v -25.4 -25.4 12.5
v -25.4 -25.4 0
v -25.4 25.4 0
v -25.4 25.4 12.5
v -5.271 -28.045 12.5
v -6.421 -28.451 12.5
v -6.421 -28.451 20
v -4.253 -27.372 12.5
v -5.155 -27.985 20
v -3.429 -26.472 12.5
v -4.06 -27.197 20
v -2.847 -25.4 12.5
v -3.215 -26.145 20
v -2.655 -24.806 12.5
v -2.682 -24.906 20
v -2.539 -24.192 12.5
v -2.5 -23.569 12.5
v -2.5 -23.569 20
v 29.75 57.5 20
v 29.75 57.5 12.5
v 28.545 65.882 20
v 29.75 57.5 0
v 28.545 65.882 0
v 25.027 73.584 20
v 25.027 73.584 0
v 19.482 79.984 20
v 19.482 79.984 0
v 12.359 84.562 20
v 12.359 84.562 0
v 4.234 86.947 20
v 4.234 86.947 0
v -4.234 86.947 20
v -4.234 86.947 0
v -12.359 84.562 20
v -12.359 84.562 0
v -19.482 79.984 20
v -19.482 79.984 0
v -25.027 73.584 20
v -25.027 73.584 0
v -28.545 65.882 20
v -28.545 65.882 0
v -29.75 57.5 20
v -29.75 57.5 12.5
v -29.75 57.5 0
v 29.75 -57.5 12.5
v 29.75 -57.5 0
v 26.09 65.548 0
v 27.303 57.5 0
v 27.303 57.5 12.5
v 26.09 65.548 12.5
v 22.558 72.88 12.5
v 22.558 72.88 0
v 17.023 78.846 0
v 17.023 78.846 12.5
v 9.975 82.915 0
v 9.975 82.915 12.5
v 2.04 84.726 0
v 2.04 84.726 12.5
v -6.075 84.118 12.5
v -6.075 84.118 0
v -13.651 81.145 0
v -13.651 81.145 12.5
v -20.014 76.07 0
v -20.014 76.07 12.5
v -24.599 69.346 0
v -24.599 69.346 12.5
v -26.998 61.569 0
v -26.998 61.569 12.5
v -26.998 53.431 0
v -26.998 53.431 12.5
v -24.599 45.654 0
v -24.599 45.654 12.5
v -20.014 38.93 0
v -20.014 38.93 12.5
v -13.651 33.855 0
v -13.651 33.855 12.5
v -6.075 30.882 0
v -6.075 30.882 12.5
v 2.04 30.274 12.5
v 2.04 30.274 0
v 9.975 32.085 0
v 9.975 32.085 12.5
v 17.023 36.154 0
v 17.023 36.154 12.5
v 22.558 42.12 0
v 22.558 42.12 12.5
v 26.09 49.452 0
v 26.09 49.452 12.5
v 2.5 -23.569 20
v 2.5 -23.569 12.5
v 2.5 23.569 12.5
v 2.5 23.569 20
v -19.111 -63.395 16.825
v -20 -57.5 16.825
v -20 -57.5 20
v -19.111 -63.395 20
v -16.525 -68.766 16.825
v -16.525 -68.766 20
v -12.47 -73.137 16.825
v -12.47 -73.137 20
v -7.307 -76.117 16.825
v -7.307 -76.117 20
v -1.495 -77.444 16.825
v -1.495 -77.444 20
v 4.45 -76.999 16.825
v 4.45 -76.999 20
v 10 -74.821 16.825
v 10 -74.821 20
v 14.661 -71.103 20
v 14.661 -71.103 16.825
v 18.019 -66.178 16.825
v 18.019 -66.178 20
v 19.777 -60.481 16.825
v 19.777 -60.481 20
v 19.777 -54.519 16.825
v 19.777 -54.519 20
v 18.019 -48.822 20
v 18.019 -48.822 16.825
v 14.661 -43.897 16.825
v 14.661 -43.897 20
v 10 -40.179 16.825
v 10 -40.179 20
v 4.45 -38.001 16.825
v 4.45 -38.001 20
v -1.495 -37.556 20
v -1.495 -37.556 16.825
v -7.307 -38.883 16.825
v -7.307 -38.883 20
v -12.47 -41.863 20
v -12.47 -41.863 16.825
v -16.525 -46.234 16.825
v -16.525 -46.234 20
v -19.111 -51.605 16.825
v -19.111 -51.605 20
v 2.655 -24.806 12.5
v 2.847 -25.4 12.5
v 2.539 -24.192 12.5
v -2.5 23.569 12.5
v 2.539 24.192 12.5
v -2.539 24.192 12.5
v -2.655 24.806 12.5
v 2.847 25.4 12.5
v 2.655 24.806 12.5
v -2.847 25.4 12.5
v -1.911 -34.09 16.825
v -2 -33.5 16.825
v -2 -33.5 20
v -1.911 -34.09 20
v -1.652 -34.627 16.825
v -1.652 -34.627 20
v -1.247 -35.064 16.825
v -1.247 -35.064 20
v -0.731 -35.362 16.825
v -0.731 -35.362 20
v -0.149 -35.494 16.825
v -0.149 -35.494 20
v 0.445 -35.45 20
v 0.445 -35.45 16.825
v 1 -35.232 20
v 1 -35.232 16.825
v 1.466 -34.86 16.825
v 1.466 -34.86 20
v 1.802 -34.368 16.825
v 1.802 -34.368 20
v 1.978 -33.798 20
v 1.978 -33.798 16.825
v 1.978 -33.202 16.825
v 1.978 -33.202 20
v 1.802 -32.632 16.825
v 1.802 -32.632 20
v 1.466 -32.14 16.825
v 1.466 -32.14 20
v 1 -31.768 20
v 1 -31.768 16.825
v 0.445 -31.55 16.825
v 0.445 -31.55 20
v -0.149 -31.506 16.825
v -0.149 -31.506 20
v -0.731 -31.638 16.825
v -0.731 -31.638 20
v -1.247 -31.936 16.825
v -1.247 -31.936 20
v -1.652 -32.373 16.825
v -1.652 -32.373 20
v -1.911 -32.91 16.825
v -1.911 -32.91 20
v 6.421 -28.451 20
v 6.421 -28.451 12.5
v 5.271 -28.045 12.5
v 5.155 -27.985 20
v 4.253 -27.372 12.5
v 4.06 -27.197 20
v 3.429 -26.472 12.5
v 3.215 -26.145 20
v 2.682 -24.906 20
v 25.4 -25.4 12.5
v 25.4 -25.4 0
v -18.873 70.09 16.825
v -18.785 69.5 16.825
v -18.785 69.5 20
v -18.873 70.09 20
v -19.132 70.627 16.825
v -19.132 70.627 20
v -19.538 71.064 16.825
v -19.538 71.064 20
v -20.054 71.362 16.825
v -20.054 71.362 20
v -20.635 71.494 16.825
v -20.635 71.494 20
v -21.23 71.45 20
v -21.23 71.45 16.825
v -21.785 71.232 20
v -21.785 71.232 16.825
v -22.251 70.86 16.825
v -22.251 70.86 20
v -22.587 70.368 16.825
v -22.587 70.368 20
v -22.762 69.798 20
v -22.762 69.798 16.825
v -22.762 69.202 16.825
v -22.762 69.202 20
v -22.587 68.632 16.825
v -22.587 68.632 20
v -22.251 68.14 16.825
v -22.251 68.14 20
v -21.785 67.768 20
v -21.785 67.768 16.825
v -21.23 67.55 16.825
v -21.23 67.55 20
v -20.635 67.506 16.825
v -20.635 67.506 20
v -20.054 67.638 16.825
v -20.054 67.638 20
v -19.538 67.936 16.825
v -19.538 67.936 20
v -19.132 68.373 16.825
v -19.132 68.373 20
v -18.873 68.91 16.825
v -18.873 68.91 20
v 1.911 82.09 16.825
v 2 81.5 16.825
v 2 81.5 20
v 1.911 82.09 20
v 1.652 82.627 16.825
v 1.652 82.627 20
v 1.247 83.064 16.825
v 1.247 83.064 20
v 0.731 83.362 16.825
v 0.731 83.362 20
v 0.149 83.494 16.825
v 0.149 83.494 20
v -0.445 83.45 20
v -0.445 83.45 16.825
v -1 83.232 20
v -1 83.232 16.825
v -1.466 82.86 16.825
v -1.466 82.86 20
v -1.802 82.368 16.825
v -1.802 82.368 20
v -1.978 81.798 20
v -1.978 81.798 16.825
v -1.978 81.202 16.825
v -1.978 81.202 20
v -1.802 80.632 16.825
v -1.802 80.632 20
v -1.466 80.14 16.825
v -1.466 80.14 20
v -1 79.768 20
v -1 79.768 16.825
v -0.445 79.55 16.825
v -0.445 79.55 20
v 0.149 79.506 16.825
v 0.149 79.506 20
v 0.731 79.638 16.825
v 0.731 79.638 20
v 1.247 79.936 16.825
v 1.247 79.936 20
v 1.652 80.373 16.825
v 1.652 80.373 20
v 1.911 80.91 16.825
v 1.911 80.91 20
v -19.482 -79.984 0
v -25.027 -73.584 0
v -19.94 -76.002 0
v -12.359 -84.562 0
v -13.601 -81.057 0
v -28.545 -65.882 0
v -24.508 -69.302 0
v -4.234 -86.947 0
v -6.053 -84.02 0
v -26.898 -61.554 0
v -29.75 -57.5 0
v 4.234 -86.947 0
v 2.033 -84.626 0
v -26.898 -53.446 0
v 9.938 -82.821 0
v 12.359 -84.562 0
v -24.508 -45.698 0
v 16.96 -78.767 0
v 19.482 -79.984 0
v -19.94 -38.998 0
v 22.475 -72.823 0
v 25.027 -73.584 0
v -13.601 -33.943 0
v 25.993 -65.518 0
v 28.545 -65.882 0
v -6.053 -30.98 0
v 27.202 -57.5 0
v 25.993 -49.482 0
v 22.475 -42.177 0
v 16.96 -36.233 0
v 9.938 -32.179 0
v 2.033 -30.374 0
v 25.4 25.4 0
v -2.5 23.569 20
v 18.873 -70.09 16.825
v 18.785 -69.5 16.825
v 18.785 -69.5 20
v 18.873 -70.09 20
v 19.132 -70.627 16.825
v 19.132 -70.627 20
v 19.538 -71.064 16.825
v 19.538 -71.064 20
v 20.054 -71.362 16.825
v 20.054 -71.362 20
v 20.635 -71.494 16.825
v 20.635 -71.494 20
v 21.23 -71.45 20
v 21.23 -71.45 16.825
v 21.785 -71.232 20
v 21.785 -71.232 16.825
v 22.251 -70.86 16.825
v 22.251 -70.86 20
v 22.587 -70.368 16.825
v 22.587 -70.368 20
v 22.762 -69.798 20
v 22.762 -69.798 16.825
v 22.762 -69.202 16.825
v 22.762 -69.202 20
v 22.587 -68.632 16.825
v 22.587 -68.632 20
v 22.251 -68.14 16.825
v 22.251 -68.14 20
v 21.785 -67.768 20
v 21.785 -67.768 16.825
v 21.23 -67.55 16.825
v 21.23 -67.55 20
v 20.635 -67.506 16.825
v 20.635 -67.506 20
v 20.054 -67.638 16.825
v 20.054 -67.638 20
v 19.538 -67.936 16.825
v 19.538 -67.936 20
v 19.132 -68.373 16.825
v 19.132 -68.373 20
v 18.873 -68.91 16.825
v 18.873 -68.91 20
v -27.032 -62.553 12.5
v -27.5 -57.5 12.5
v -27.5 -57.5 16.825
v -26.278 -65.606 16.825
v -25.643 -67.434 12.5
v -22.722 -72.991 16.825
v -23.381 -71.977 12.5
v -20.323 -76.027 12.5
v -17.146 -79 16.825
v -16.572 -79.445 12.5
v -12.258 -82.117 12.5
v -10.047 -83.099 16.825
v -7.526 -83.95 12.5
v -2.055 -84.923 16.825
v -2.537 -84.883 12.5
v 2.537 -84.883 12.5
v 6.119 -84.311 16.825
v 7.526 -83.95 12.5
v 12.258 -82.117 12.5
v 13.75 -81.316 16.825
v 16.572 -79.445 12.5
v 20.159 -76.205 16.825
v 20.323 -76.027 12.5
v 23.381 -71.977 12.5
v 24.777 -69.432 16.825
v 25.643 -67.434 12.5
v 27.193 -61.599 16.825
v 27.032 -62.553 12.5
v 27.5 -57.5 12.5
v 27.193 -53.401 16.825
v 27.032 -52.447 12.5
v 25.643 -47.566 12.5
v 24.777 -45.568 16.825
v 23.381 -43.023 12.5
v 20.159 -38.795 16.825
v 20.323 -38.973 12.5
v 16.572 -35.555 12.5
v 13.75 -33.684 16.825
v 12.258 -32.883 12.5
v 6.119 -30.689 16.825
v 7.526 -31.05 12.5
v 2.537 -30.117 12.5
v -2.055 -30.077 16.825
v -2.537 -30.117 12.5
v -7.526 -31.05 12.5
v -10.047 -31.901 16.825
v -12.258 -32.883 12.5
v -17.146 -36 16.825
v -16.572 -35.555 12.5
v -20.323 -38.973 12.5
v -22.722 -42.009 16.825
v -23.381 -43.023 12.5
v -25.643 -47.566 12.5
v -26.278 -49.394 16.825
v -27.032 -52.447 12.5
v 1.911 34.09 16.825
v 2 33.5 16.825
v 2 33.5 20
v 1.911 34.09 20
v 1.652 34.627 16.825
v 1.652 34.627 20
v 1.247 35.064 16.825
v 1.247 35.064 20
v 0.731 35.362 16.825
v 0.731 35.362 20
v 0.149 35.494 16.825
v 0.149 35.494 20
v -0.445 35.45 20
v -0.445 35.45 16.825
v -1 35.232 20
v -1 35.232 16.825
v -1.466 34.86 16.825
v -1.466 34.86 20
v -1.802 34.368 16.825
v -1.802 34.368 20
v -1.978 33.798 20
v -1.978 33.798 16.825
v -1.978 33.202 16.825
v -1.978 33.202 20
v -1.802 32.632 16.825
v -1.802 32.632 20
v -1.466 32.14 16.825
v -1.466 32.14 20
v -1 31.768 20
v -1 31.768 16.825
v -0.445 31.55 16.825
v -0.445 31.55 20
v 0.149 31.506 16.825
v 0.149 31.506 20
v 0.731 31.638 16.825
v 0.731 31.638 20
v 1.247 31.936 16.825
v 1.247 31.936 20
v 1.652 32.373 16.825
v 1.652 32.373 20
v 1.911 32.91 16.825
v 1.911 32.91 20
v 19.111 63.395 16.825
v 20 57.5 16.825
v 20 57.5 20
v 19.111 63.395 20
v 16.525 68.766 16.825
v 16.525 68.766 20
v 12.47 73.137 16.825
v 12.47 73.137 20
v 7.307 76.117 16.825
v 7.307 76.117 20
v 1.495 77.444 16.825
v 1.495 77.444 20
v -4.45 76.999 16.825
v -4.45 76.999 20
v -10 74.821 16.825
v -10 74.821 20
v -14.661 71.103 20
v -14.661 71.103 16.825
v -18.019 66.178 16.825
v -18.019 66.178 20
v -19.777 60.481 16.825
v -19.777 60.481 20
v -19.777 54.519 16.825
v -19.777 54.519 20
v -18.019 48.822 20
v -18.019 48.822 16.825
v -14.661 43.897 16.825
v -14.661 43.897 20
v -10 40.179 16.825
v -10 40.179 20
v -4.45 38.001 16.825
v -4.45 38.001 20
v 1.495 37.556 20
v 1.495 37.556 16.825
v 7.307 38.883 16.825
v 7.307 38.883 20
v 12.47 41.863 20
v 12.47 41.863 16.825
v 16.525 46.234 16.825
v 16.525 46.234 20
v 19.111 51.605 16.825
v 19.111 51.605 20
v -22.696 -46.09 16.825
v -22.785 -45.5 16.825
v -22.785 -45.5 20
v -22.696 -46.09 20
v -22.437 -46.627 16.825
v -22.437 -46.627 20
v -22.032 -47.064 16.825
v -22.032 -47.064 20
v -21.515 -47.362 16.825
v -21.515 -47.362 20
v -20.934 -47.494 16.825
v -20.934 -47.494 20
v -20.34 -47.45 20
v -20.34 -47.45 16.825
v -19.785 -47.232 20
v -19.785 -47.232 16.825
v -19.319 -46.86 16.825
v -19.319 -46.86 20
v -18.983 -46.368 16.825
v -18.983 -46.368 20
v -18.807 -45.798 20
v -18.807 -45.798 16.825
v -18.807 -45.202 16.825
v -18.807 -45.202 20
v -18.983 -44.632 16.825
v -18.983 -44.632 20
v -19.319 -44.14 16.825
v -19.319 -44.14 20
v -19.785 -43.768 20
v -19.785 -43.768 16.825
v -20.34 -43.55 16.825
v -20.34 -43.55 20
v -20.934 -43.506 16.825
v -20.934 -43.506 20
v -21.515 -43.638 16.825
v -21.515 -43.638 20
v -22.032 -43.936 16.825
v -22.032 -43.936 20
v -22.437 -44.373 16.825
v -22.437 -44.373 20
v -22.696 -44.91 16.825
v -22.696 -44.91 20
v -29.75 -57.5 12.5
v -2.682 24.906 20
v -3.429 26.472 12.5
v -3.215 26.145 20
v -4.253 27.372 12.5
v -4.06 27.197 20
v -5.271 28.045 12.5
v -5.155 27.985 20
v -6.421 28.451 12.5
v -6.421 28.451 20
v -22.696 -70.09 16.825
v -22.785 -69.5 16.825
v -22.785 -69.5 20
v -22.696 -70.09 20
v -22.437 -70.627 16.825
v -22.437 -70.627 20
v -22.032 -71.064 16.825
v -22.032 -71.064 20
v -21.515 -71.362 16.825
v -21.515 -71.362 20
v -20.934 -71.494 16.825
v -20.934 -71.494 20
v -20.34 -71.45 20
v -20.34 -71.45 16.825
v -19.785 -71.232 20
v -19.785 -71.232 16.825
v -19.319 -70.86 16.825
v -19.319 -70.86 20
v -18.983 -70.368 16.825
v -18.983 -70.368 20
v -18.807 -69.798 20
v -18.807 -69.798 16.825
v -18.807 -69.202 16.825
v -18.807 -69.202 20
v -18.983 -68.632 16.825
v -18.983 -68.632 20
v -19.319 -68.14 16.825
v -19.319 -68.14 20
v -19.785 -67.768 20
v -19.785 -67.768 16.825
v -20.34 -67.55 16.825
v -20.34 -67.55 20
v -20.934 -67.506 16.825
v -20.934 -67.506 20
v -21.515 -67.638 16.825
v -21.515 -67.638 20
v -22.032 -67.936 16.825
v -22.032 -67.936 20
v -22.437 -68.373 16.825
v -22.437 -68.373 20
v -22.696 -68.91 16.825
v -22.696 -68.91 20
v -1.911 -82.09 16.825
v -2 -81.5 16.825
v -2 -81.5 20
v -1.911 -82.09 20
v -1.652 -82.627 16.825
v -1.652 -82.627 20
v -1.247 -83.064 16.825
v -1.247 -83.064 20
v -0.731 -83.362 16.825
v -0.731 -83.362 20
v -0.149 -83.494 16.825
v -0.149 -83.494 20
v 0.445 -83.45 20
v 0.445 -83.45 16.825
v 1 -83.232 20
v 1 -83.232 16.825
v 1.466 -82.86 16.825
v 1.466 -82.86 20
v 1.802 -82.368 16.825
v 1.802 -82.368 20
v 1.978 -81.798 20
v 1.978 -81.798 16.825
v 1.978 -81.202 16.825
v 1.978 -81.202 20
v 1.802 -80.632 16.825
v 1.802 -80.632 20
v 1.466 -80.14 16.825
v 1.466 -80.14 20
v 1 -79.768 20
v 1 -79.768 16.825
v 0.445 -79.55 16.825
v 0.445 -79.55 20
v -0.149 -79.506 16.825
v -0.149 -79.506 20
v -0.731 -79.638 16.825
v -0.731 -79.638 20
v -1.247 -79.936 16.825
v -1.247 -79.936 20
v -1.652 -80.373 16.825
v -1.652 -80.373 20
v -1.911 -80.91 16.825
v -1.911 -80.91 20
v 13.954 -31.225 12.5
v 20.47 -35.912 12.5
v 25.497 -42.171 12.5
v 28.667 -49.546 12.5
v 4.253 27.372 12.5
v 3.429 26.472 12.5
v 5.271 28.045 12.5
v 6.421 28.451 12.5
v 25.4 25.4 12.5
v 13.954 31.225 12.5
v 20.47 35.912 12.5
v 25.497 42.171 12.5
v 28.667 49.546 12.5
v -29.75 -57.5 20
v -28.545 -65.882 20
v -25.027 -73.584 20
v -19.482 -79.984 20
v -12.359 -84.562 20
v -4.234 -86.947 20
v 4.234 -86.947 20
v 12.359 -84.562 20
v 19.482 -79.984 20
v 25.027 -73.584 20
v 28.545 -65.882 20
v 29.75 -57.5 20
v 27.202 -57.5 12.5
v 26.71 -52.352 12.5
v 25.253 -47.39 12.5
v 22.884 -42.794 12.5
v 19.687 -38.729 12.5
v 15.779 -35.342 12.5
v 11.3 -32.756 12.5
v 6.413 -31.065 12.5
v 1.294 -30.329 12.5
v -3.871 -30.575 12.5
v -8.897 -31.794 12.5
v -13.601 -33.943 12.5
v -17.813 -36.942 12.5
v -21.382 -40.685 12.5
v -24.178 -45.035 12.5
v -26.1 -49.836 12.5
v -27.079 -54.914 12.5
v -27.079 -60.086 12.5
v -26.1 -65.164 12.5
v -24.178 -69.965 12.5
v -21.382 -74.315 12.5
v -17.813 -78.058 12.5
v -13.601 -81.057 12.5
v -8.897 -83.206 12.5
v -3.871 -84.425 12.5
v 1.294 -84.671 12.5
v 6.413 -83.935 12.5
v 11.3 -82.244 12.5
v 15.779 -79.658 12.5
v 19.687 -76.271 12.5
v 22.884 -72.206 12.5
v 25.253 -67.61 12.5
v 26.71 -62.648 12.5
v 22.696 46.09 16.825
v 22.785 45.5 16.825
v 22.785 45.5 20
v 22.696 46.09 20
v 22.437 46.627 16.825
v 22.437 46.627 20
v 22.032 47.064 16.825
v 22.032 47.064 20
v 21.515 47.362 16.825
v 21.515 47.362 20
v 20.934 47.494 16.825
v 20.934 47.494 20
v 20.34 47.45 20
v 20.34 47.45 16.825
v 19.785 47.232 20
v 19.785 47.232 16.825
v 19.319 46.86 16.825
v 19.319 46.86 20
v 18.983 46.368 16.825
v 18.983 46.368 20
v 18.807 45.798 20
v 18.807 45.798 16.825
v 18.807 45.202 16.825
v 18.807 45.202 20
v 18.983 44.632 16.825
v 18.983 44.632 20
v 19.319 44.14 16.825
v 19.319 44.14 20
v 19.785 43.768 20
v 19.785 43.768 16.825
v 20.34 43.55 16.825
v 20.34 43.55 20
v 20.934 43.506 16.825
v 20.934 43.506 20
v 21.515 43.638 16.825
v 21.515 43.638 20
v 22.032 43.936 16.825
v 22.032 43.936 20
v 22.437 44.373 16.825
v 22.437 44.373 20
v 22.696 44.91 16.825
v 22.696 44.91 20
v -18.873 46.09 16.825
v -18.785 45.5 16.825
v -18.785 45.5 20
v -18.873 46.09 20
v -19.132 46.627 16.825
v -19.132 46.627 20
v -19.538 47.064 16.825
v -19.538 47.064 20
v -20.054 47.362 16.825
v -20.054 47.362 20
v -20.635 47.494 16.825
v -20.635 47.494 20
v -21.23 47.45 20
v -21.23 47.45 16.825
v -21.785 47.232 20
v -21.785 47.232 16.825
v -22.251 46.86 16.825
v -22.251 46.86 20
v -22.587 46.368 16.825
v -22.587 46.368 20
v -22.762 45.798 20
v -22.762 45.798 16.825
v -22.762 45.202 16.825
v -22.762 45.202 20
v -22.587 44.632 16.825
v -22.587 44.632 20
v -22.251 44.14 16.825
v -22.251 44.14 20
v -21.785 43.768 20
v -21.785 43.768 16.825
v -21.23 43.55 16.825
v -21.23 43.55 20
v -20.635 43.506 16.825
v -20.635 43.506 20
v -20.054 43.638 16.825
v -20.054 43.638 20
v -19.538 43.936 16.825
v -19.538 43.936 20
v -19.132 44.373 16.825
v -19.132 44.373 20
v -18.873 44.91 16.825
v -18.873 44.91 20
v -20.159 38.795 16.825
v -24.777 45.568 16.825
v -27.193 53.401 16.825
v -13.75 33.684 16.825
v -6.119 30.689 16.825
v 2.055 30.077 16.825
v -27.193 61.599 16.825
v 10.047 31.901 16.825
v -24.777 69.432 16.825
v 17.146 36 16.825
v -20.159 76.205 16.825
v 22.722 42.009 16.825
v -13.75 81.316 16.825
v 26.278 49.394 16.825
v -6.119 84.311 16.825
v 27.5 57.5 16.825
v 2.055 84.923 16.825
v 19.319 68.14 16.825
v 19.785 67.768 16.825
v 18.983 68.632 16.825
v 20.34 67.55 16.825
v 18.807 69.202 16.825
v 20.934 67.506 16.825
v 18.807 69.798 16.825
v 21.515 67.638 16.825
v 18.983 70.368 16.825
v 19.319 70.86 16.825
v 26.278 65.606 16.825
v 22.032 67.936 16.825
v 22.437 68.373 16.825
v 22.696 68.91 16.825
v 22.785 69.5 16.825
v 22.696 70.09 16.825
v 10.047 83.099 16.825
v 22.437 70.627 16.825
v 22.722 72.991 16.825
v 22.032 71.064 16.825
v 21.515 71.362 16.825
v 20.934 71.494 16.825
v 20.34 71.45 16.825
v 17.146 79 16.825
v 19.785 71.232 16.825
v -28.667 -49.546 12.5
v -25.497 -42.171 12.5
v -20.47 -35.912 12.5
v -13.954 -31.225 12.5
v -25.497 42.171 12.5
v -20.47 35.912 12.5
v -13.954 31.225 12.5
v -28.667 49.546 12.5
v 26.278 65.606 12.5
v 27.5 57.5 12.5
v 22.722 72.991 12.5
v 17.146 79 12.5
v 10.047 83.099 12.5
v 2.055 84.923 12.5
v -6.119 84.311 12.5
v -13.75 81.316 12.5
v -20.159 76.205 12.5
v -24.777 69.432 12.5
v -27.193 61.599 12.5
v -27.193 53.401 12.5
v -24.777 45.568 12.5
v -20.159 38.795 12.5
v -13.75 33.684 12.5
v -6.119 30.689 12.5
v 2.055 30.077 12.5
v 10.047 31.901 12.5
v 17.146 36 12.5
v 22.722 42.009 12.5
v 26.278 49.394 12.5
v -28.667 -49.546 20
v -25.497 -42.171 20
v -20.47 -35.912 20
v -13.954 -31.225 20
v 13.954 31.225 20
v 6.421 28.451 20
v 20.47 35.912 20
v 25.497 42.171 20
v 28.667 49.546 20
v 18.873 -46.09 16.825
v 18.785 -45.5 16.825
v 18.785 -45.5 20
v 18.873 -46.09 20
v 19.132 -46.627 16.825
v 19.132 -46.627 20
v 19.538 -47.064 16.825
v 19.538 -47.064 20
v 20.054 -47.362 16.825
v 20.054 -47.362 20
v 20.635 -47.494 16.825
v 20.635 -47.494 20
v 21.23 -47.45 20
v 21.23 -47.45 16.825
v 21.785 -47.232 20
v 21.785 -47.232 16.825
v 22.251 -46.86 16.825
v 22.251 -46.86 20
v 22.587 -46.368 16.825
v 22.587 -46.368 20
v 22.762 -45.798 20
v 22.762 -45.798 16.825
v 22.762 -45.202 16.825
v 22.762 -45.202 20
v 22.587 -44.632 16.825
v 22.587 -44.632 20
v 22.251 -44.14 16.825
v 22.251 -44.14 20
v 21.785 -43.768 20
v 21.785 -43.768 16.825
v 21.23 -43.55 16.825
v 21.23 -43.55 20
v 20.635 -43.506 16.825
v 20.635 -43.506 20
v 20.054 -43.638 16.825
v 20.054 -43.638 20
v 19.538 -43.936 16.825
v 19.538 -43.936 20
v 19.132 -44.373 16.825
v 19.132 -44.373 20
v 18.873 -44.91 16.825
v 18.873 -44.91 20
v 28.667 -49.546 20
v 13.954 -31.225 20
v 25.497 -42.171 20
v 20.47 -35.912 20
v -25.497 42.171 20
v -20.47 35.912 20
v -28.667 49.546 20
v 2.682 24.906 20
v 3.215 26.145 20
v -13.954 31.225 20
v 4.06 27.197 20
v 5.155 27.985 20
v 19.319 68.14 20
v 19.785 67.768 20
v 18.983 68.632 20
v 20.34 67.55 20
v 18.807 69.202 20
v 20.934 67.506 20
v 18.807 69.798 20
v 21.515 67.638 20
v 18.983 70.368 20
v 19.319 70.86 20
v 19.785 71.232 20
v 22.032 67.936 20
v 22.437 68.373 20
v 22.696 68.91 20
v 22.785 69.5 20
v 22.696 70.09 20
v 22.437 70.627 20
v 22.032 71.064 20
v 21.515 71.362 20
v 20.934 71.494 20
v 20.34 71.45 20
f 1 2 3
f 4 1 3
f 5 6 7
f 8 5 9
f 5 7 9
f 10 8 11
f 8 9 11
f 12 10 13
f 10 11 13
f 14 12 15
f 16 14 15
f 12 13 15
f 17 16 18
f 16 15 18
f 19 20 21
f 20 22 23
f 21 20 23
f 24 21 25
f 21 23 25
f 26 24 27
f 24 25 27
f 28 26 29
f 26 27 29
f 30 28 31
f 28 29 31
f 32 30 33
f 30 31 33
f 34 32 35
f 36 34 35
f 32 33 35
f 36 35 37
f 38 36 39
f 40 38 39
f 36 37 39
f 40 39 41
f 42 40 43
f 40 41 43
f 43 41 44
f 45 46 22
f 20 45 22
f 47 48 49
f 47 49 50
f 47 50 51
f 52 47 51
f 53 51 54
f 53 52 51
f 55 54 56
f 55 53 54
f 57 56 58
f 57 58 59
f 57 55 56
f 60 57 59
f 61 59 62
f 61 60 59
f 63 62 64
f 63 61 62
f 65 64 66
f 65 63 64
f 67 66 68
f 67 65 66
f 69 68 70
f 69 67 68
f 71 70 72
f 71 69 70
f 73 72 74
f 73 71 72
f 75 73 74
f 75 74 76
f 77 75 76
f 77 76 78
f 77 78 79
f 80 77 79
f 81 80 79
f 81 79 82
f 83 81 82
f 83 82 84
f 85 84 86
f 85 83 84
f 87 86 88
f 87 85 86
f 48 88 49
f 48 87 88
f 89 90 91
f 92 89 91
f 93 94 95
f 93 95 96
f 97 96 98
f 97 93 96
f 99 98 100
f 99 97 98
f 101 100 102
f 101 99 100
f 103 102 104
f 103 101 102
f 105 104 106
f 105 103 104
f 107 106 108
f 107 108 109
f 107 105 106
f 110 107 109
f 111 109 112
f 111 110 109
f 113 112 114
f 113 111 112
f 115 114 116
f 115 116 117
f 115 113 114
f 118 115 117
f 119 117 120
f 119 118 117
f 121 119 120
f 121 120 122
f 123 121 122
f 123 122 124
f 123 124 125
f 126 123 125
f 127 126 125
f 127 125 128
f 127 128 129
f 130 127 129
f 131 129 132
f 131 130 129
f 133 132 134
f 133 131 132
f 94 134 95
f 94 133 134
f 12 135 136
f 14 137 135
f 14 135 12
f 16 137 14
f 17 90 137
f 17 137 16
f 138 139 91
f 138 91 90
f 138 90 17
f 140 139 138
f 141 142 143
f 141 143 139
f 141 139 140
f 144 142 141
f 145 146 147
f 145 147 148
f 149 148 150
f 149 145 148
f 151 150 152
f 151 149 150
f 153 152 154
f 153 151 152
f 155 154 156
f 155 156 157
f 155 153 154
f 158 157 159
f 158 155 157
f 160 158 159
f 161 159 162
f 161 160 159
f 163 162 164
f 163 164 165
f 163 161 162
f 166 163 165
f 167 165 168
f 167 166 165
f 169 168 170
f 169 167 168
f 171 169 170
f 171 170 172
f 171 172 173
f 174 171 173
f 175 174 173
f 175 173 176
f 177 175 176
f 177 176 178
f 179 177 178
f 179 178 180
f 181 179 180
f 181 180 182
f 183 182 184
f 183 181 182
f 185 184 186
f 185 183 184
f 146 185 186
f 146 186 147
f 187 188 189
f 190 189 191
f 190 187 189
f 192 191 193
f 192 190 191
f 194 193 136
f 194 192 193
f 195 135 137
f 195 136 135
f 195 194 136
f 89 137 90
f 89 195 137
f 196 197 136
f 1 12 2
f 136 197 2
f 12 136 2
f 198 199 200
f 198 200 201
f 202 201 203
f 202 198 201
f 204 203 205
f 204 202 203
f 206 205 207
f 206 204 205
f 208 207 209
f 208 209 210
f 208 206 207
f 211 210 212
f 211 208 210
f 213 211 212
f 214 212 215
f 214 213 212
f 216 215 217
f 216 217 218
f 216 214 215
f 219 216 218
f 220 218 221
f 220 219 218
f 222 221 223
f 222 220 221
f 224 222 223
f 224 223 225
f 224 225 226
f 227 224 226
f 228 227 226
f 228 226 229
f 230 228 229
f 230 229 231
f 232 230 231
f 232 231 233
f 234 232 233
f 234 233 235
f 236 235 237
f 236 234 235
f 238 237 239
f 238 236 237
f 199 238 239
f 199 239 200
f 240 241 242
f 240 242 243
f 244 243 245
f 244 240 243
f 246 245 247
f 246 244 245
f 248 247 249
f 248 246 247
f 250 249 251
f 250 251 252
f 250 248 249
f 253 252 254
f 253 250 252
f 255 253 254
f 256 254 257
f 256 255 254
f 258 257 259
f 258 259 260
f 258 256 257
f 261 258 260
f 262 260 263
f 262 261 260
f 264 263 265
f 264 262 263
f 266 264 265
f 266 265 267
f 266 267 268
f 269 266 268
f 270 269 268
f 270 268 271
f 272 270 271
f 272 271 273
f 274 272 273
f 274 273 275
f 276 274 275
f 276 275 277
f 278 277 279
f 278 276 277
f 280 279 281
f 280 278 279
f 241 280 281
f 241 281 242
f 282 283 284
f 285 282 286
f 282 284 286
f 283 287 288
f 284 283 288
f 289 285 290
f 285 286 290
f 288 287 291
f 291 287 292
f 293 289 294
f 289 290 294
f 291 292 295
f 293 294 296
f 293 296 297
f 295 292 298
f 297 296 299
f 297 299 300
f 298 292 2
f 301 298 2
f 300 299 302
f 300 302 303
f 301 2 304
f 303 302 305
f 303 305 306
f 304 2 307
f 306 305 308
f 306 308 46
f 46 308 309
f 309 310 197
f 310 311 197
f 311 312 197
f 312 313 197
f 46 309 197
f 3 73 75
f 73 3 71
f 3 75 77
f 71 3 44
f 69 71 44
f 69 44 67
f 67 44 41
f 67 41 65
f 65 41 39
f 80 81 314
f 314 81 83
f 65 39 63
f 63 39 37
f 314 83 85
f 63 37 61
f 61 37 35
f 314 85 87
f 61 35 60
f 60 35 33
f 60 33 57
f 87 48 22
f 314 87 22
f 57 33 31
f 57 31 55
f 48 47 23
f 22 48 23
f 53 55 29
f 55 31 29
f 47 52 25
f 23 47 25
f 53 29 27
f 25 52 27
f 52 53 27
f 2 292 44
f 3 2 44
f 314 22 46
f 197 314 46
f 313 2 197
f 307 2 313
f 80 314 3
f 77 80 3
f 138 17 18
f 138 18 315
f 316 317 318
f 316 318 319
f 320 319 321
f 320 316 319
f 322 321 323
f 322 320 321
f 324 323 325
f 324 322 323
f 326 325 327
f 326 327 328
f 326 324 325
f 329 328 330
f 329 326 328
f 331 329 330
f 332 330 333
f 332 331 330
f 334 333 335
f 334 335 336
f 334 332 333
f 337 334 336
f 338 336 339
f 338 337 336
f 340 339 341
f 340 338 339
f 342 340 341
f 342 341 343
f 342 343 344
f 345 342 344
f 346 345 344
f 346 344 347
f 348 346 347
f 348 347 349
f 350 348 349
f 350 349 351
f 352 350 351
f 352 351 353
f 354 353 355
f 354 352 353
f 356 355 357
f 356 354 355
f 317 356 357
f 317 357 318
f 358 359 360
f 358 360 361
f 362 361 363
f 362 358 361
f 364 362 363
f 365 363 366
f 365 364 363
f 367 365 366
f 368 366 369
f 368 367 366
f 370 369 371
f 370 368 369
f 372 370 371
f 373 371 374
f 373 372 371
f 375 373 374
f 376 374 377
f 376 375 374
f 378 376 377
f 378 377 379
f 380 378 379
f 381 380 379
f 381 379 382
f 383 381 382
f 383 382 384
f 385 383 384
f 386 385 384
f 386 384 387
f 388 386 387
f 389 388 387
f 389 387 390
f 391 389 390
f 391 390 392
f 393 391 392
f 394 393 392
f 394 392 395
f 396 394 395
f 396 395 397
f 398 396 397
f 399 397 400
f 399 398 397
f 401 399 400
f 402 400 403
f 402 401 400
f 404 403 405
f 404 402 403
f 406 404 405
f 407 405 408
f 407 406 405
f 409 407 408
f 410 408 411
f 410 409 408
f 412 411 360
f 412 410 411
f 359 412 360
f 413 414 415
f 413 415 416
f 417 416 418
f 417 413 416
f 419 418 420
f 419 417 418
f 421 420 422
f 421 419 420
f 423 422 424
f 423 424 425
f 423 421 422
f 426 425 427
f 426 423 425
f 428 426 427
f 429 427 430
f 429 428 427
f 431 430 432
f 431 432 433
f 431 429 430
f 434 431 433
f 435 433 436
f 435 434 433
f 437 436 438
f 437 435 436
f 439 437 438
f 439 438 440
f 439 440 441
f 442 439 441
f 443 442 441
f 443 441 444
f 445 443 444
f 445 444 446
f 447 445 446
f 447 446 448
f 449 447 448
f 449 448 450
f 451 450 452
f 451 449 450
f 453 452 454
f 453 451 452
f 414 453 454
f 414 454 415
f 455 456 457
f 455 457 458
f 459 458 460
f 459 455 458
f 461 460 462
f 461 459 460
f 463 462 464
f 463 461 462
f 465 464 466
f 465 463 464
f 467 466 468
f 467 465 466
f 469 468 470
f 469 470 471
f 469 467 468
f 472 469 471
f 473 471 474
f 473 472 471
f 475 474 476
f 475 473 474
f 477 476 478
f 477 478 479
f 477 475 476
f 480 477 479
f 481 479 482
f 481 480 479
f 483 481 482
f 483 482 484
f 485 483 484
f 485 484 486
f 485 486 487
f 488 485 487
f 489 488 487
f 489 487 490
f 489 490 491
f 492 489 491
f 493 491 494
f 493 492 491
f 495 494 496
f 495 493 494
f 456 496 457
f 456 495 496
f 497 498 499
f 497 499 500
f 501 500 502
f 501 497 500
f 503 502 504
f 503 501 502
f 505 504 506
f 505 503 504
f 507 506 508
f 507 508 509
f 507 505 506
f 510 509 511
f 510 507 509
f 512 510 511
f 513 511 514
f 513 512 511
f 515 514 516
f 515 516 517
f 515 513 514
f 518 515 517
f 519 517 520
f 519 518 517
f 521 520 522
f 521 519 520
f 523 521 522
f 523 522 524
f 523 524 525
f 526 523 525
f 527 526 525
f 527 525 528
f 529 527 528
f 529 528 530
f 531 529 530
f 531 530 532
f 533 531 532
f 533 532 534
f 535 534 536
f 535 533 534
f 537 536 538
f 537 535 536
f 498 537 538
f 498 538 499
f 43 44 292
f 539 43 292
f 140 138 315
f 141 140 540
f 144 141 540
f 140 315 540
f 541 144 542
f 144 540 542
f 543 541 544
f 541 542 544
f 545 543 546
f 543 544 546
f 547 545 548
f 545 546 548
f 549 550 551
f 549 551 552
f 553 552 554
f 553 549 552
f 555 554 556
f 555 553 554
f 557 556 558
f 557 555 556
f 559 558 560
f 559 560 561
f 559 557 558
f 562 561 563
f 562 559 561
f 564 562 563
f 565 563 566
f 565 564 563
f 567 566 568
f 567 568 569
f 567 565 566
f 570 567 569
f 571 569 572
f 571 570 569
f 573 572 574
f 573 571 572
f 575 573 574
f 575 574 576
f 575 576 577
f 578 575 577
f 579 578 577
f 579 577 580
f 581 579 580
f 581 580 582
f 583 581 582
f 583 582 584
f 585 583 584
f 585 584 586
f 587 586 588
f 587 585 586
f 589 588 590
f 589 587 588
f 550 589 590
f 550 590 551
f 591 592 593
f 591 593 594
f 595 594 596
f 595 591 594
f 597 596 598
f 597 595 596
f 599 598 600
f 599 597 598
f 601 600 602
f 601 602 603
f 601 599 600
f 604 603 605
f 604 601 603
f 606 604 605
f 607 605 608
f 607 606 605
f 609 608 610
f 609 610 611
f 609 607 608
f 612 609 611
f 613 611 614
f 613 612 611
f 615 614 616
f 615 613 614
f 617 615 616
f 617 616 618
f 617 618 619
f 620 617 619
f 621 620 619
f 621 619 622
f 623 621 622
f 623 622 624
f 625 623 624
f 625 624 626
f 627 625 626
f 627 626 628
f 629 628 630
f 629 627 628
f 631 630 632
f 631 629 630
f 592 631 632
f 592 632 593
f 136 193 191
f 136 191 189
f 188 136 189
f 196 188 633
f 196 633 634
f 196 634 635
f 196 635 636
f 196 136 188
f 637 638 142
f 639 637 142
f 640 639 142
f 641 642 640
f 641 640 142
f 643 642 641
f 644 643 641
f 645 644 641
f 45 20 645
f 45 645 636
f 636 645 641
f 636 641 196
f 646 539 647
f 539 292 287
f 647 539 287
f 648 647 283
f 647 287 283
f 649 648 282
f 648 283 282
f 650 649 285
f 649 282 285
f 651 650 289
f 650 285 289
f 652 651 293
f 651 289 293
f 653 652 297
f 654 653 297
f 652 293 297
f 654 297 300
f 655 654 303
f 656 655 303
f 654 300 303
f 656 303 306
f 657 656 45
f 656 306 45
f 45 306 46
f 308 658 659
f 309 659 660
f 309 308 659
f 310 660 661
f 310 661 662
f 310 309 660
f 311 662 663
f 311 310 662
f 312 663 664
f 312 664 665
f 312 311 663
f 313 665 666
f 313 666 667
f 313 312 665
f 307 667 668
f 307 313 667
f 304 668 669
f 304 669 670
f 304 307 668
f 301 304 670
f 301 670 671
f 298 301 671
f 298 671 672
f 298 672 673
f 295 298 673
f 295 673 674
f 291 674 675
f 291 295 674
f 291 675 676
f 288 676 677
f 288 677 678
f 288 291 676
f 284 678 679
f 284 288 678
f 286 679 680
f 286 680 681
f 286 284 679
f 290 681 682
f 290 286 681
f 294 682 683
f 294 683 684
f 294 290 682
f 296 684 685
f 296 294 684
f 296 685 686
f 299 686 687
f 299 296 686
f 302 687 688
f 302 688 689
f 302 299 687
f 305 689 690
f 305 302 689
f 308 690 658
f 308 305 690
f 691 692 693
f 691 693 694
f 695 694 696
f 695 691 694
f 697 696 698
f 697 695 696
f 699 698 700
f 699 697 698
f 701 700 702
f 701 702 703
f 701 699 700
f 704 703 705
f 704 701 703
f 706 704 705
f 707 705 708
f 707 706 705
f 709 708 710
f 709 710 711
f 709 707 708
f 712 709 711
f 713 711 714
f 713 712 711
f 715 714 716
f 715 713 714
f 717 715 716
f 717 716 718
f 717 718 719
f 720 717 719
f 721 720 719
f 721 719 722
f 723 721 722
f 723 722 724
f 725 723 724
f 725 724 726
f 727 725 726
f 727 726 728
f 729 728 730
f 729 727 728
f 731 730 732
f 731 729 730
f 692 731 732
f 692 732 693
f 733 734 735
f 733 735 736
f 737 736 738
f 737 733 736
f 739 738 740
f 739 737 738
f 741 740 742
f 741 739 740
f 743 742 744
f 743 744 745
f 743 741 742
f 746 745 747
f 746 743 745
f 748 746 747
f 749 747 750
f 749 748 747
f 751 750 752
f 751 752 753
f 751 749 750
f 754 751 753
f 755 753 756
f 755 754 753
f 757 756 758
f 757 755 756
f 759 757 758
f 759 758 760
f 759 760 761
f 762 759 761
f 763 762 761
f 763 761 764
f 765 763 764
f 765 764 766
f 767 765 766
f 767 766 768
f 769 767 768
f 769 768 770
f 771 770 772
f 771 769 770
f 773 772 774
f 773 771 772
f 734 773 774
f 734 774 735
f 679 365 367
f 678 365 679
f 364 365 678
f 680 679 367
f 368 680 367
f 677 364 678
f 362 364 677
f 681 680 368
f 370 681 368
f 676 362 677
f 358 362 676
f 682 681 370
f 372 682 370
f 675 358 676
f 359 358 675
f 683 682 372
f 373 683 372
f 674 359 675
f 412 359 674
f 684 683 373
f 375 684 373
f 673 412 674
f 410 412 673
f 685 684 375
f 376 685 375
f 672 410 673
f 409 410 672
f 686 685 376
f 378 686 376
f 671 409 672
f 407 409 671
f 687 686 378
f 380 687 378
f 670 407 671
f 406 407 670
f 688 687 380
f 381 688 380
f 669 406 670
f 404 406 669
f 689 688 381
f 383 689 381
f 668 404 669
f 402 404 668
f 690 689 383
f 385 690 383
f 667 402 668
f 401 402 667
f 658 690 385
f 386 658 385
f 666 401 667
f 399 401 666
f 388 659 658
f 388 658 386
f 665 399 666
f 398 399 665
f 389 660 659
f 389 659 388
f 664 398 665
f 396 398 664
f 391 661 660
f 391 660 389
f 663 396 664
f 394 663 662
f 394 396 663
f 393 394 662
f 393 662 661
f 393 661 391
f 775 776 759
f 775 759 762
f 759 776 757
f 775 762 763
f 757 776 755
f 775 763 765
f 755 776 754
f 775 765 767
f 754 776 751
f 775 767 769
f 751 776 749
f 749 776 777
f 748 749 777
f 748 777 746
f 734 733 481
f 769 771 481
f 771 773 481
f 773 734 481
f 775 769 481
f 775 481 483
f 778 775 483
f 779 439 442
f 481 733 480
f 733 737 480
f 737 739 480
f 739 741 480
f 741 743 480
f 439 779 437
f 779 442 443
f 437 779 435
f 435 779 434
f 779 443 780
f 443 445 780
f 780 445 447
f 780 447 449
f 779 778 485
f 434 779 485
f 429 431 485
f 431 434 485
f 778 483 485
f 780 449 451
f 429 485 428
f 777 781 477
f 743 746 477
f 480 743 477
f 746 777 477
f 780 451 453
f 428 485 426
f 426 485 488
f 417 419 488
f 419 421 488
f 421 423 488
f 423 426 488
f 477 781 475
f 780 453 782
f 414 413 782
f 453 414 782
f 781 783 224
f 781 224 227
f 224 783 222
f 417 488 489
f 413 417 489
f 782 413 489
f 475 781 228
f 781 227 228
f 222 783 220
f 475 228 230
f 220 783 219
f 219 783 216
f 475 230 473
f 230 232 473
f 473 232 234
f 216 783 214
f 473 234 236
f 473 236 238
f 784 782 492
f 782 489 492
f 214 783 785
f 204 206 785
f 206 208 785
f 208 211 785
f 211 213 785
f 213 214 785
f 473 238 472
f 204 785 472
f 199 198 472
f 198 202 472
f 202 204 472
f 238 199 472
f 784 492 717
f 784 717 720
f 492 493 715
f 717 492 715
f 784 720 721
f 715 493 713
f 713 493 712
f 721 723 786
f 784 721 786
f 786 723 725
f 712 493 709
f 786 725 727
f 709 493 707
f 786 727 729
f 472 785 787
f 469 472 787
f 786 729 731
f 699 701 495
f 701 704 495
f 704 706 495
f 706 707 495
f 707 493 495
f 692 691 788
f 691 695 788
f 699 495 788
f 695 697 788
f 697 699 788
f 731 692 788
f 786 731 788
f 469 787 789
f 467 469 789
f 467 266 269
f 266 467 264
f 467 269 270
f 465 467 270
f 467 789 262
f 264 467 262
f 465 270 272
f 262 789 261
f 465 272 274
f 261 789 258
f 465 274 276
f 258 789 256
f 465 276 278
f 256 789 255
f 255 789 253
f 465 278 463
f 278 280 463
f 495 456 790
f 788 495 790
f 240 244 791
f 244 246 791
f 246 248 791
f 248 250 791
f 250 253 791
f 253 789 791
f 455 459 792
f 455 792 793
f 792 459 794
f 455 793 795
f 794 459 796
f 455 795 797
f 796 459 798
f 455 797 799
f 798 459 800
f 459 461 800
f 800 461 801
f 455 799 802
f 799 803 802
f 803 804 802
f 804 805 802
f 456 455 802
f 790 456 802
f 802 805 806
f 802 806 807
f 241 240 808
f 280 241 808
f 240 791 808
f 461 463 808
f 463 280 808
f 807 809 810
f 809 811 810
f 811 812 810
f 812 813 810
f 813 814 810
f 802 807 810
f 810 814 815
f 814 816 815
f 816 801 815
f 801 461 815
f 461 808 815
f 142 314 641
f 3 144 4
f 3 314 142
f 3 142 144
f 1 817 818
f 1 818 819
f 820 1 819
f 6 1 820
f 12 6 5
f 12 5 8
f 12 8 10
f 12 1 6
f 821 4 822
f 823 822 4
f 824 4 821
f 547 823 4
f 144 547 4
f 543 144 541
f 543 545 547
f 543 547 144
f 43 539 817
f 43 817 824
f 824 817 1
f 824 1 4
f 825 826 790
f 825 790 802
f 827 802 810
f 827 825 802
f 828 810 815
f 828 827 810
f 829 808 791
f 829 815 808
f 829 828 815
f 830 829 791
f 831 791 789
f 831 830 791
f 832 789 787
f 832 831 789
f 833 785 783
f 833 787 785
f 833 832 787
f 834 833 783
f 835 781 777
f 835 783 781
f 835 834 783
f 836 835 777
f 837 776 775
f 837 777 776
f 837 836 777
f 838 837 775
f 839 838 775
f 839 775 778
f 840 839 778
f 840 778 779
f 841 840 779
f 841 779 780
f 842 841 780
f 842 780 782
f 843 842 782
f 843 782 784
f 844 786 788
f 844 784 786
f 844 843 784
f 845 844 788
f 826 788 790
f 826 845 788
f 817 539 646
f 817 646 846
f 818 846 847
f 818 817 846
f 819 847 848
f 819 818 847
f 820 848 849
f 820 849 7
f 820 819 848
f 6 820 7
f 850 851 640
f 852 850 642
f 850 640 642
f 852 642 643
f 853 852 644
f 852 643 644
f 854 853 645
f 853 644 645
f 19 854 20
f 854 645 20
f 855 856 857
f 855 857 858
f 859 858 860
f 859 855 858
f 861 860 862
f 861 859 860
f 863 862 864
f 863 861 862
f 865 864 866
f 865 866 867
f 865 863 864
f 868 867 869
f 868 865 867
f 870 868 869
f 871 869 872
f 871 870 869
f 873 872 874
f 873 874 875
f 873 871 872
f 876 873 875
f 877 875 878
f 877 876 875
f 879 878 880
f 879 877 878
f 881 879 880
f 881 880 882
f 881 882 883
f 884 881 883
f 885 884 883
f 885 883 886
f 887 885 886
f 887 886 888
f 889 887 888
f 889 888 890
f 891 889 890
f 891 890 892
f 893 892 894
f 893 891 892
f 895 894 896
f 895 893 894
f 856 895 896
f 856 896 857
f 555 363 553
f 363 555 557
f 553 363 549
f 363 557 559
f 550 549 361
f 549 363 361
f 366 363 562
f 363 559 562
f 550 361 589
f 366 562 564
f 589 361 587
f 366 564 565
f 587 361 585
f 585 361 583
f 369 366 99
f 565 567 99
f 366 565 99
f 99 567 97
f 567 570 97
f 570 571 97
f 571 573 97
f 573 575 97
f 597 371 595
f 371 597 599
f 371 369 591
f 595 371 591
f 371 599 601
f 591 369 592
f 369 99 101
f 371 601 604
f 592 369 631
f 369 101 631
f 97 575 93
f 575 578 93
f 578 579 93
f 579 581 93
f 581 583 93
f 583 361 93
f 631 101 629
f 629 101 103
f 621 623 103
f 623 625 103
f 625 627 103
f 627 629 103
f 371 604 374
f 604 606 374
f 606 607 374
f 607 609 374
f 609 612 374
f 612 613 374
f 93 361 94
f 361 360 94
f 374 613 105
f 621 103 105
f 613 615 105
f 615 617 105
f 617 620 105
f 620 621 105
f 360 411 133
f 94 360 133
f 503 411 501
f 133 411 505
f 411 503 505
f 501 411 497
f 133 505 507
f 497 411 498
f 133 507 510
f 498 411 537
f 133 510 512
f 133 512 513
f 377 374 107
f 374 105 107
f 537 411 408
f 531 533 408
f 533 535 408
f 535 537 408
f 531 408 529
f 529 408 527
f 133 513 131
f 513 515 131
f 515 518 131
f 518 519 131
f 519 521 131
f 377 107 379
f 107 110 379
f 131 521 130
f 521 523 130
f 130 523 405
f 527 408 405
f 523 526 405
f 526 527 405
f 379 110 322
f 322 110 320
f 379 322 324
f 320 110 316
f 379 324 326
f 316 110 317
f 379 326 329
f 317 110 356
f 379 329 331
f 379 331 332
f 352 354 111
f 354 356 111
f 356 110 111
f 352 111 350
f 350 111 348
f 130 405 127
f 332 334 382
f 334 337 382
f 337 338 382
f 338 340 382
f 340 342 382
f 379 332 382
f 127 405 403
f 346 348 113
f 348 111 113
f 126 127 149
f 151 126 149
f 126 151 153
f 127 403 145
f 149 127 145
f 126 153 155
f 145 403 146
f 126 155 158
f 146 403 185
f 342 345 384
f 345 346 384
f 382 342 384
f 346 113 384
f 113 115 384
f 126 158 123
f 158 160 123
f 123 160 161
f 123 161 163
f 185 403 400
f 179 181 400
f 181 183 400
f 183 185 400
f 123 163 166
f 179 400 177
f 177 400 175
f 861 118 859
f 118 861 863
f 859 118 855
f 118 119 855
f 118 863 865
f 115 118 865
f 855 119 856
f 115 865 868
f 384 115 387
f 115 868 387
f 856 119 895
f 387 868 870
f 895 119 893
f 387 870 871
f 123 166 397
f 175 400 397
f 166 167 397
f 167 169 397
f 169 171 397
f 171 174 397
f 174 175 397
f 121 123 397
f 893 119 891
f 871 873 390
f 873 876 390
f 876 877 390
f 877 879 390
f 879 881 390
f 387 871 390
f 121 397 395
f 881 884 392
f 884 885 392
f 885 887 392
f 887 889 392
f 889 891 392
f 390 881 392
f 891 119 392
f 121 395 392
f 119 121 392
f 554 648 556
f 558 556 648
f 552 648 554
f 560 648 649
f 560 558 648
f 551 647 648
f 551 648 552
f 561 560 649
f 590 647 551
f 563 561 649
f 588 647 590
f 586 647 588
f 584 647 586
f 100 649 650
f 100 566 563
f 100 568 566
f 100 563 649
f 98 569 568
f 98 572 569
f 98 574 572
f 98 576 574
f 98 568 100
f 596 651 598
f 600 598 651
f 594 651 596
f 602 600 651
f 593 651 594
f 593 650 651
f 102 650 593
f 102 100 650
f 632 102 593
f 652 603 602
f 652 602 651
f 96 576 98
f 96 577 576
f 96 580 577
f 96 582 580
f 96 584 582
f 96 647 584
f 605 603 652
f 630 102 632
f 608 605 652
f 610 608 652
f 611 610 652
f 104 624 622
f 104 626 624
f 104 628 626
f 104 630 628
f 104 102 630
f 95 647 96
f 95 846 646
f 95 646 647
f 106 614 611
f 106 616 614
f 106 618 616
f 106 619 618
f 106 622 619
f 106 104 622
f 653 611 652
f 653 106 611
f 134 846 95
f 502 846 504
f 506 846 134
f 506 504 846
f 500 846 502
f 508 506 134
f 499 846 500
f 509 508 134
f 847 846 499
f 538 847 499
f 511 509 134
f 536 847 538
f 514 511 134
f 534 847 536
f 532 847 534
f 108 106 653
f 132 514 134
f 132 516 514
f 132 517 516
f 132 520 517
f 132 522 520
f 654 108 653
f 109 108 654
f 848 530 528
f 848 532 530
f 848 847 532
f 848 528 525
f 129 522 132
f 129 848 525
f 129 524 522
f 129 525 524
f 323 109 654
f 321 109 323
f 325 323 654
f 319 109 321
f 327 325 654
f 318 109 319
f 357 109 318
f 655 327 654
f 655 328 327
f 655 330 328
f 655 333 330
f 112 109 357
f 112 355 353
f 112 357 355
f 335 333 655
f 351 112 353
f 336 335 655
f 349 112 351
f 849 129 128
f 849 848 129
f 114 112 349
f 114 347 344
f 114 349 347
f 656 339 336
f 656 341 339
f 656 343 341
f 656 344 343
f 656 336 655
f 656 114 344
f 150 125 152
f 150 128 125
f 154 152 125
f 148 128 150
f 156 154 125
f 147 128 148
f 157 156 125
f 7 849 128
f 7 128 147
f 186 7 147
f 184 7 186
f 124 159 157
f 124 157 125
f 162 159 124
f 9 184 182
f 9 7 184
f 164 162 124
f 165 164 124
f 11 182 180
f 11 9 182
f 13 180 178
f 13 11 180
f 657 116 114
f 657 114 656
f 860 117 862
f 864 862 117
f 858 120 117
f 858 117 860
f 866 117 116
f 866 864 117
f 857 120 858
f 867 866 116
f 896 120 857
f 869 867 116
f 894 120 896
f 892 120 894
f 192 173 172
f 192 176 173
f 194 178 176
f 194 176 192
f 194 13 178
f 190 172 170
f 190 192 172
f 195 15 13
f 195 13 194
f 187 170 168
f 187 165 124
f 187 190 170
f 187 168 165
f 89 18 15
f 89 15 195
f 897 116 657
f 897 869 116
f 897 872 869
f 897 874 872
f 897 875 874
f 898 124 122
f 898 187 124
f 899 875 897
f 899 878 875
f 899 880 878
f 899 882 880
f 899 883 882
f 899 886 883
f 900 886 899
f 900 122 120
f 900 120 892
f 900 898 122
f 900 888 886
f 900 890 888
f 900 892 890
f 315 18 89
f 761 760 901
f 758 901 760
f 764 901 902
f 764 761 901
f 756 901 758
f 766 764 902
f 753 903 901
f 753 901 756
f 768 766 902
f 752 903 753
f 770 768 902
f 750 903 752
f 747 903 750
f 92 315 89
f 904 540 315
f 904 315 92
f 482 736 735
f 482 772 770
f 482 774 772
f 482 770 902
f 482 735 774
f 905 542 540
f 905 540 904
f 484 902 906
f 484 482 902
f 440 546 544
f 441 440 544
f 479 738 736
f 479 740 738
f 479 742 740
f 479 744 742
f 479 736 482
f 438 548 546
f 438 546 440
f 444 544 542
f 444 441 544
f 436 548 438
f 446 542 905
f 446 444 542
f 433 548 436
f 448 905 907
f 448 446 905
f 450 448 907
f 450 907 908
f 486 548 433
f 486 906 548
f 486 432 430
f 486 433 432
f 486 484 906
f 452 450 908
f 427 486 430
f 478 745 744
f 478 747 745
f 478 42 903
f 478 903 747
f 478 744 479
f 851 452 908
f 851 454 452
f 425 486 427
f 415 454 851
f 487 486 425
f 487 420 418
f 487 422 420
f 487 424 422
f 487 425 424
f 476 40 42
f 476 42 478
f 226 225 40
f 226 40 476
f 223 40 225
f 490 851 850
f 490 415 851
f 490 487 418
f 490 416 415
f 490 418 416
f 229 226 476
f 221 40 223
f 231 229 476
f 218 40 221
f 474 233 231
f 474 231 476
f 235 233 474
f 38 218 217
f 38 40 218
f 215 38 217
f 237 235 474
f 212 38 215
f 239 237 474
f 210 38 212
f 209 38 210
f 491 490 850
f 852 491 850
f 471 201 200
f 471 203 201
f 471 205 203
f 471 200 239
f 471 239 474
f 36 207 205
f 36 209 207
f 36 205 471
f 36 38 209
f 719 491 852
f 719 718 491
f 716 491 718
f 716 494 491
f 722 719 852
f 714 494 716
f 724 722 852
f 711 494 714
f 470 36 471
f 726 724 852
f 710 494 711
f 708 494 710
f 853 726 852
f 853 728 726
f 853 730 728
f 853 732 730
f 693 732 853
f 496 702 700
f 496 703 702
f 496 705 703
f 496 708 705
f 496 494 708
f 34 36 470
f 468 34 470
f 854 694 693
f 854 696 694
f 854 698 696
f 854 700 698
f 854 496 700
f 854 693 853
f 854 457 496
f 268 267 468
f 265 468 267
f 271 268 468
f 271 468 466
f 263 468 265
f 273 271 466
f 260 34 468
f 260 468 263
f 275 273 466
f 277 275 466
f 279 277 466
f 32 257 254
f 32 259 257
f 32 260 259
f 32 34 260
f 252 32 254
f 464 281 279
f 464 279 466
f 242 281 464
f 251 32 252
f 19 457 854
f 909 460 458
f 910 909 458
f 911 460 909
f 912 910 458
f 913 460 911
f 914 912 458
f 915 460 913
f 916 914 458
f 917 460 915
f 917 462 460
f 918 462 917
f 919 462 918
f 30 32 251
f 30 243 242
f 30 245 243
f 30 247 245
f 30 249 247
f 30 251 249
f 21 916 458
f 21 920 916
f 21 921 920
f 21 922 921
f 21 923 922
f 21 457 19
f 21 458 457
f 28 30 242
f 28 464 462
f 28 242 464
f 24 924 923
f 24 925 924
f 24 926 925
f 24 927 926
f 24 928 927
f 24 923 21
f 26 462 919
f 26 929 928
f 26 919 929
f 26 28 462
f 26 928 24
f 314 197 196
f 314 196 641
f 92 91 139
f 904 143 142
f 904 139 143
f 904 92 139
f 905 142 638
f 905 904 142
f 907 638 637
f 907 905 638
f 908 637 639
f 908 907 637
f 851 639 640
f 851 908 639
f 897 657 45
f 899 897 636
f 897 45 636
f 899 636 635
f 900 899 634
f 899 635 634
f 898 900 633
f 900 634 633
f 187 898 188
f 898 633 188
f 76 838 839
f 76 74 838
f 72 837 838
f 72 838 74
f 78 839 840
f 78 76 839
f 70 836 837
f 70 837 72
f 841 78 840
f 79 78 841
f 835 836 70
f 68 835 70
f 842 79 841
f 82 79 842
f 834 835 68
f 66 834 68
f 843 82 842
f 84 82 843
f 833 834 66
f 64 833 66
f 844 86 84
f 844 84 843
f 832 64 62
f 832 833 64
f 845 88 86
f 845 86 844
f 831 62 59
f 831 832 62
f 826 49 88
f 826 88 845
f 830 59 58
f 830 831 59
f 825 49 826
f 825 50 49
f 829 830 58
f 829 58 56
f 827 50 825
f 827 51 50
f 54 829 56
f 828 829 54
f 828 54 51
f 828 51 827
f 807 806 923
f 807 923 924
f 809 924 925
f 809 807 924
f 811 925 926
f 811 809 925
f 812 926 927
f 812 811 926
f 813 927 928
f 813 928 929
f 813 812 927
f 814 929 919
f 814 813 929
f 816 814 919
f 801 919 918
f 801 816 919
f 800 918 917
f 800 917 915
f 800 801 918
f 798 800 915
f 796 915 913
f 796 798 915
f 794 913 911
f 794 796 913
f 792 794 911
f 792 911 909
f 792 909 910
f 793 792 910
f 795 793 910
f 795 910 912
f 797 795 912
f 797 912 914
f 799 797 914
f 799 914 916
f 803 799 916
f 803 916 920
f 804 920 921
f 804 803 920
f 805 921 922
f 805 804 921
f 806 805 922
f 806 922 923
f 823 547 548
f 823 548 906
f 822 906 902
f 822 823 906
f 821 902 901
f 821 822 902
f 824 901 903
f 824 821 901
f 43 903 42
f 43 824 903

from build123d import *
from build123d.topology import SkipClean

# Parameters (mm, degrees)
SKETCH1_R           = 27.5
BOSS_EXTRUDE1_DEPTH = 20
BOSS_EXTRUDE2_START = -3.175
SKETCH2_R           = 20
SKETCH2_R_2         = 2
BOSS_EXTRUDE2_DEPTH = 3.175
CUT_EXTRUDE6_DEPTH  = 44
FILLET4_R           = 5
SKETCH9_R           = 27.302550199
SKETCH9_R_2         = 27.201682831
BOSS_EXTRUDE3_DEPTH = 12.5
SKETCH12_W          = 50.8
SKETCH12_H          = 50.8
CUT_EXTRUDE7_DEPTH  = 12.5


with BuildPart() as part:
    # Sketch1 → Boss-Extrude1 (new body)
    with BuildSketch(Plane.XY):
        with BuildLine():
            Line((-29.75, 57.5), (-29.75, -57.5))
            ThreePointArc((-29.75, -57.5), (0, -87.25), (29.75, -57.5))
            Line((29.75, -57.5), (29.75, 57.5))
            ThreePointArc((29.75, 57.5), (0, 87.25), (-29.75, 57.5))
        make_face()
        with Locations((0, 57.5)):
            Circle(SKETCH1_R, mode=Mode.SUBTRACT)
        with Locations(Location((0, -57.5, 0), (0, 0, 180))):
            Circle(SKETCH1_R, mode=Mode.SUBTRACT)
    extrude(amount=BOSS_EXTRUDE1_DEPTH)

    # Sketch2 → Boss-Extrude2 (add)
    with BuildSketch(Plane.XY.offset(20).offset(BOSS_EXTRUDE2_START)):
        with BuildLine():
            Line((-29.75, 57.5), (-29.75, -57.5))
            ThreePointArc((-29.75, -57.5), (0, -87.25), (29.75, -57.5))
            Line((29.75, -57.5), (29.75, 57.5))
            ThreePointArc((29.75, 57.5), (0, 87.25), (-29.75, 57.5))
        make_face()
        with Locations((0, 57.5)):
            Circle(SKETCH2_R, mode=Mode.SUBTRACT)
        with Locations((0, 81.5)):
            Circle(SKETCH2_R_2, mode=Mode.SUBTRACT)
        with Locations((20.784609691, 69.5)):
            Circle(SKETCH2_R_2, mode=Mode.SUBTRACT)
        with Locations((20.784609691, 45.5)):
            Circle(SKETCH2_R_2, mode=Mode.SUBTRACT)
        with Locations((0, 33.5)):
            Circle(SKETCH2_R_2, mode=Mode.SUBTRACT)
        with Locations((-20.784609691, 45.5)):
            Circle(SKETCH2_R_2, mode=Mode.SUBTRACT)
        with Locations((-20.784609691, 69.5)):
            Circle(SKETCH2_R_2, mode=Mode.SUBTRACT)
        with Locations(Location((-20.784609691, -69.5, 0), (0, 0, 180))):
            Circle(SKETCH2_R_2, mode=Mode.SUBTRACT)
        with Locations(Location((-20.784609691, -45.5, 0), (0, 0, 180))):
            Circle(SKETCH2_R_2, mode=Mode.SUBTRACT)
        with Locations(Location((0, -33.5, 0), (0, 0, 180))):
            Circle(SKETCH2_R_2, mode=Mode.SUBTRACT)
        with Locations(Location((20.784609691, -45.5, 0), (0, 0, 180))):
            Circle(SKETCH2_R_2, mode=Mode.SUBTRACT)
        with Locations(Location((20.784609691, -69.5, 0), (0, 0, 180))):
            Circle(SKETCH2_R_2, mode=Mode.SUBTRACT)
        with Locations(Location((0, -81.5, 0), (0, 0, 180))):
            Circle(SKETCH2_R_2, mode=Mode.SUBTRACT)
        with Locations(Location((0, -57.5, 0), (0, 0, 180))):
            Circle(SKETCH2_R, mode=Mode.SUBTRACT)
    extrude(amount=BOSS_EXTRUDE2_DEPTH)

    # Sketch8 → Cut-Extrude6 (cut)
    with SkipClean():  # the faces are left unmerged after this step: merging them gives an invalid solid
        with BuildSketch(Plane(origin=(0, 0, 0), x_dir=(-1, 0, 0), z_dir=(0, 0, -1))):
            with BuildLine():
                Line((-2.5, -27.855228117), (-2.5, 27.855228117))
                ThreePointArc((-2.5, 27.855228117), (-21.902482736, 37.366849477), (-29.75, 57.5))
                Line((-29.75, 57.5), (-29.75, -57.5))
                ThreePointArc((-29.75, -57.5), (-21.902482736, -37.366849477), (-2.5, -27.855228117))
            make_face()
            with BuildLine():
                Line((2.5, -27.855228117), (2.5, 27.855228117))
                ThreePointArc((2.5, 27.855228117), (21.902482736, 37.366849477), (29.75, 57.5))
                Line((29.75, 57.5), (29.75, -57.5))
                ThreePointArc((29.75, -57.5), (21.902482736, -37.366849477), (2.5, -27.855228117))
            make_face()
        extrude(amount=-CUT_EXTRUDE6_DEPTH, mode=Mode.SUBTRACT)

    # Fillet4
    fillet4_edges = [part.edges().sort_by_distance(p)[0] for p in [
        (2.5, -27.855228117, 10),
        (2.5, 27.855228117, 10),
        (-2.5, 27.855228117, 10),
        (-2.5, -27.855228117, 10),
    ]]
    fillet(fillet4_edges, radius=FILLET4_R)

    # Sketch9 → Boss-Extrude3 (add)
    with BuildSketch(Plane.XY):
        with BuildLine():
            Line((-29.75, 57.5), (-29.75, -57.5))
            ThreePointArc((-29.75, -57.5), (0, -87.25), (29.75, -57.5))
            Line((29.75, -57.5), (29.75, 57.5))
            ThreePointArc((29.75, 57.5), (0, 87.25), (-29.75, 57.5))
        make_face()
        with Locations((0, 57.5)):
            Circle(SKETCH9_R, mode=Mode.SUBTRACT)
        with Locations((0, -57.5)):
            Circle(SKETCH9_R_2, mode=Mode.SUBTRACT)
    extrude(amount=BOSS_EXTRUDE3_DEPTH)

    # Sketch12 → Cut-Extrude7 (cut)
    with BuildSketch(Plane(origin=(0, 0, 0), x_dir=(-1, 0, 0), z_dir=(0, 0, -1))):
        Rectangle(SKETCH12_W, SKETCH12_H)
    extrude(amount=-CUT_EXTRUDE7_DEPTH, mode=Mode.SUBTRACT)


solid = part.part
